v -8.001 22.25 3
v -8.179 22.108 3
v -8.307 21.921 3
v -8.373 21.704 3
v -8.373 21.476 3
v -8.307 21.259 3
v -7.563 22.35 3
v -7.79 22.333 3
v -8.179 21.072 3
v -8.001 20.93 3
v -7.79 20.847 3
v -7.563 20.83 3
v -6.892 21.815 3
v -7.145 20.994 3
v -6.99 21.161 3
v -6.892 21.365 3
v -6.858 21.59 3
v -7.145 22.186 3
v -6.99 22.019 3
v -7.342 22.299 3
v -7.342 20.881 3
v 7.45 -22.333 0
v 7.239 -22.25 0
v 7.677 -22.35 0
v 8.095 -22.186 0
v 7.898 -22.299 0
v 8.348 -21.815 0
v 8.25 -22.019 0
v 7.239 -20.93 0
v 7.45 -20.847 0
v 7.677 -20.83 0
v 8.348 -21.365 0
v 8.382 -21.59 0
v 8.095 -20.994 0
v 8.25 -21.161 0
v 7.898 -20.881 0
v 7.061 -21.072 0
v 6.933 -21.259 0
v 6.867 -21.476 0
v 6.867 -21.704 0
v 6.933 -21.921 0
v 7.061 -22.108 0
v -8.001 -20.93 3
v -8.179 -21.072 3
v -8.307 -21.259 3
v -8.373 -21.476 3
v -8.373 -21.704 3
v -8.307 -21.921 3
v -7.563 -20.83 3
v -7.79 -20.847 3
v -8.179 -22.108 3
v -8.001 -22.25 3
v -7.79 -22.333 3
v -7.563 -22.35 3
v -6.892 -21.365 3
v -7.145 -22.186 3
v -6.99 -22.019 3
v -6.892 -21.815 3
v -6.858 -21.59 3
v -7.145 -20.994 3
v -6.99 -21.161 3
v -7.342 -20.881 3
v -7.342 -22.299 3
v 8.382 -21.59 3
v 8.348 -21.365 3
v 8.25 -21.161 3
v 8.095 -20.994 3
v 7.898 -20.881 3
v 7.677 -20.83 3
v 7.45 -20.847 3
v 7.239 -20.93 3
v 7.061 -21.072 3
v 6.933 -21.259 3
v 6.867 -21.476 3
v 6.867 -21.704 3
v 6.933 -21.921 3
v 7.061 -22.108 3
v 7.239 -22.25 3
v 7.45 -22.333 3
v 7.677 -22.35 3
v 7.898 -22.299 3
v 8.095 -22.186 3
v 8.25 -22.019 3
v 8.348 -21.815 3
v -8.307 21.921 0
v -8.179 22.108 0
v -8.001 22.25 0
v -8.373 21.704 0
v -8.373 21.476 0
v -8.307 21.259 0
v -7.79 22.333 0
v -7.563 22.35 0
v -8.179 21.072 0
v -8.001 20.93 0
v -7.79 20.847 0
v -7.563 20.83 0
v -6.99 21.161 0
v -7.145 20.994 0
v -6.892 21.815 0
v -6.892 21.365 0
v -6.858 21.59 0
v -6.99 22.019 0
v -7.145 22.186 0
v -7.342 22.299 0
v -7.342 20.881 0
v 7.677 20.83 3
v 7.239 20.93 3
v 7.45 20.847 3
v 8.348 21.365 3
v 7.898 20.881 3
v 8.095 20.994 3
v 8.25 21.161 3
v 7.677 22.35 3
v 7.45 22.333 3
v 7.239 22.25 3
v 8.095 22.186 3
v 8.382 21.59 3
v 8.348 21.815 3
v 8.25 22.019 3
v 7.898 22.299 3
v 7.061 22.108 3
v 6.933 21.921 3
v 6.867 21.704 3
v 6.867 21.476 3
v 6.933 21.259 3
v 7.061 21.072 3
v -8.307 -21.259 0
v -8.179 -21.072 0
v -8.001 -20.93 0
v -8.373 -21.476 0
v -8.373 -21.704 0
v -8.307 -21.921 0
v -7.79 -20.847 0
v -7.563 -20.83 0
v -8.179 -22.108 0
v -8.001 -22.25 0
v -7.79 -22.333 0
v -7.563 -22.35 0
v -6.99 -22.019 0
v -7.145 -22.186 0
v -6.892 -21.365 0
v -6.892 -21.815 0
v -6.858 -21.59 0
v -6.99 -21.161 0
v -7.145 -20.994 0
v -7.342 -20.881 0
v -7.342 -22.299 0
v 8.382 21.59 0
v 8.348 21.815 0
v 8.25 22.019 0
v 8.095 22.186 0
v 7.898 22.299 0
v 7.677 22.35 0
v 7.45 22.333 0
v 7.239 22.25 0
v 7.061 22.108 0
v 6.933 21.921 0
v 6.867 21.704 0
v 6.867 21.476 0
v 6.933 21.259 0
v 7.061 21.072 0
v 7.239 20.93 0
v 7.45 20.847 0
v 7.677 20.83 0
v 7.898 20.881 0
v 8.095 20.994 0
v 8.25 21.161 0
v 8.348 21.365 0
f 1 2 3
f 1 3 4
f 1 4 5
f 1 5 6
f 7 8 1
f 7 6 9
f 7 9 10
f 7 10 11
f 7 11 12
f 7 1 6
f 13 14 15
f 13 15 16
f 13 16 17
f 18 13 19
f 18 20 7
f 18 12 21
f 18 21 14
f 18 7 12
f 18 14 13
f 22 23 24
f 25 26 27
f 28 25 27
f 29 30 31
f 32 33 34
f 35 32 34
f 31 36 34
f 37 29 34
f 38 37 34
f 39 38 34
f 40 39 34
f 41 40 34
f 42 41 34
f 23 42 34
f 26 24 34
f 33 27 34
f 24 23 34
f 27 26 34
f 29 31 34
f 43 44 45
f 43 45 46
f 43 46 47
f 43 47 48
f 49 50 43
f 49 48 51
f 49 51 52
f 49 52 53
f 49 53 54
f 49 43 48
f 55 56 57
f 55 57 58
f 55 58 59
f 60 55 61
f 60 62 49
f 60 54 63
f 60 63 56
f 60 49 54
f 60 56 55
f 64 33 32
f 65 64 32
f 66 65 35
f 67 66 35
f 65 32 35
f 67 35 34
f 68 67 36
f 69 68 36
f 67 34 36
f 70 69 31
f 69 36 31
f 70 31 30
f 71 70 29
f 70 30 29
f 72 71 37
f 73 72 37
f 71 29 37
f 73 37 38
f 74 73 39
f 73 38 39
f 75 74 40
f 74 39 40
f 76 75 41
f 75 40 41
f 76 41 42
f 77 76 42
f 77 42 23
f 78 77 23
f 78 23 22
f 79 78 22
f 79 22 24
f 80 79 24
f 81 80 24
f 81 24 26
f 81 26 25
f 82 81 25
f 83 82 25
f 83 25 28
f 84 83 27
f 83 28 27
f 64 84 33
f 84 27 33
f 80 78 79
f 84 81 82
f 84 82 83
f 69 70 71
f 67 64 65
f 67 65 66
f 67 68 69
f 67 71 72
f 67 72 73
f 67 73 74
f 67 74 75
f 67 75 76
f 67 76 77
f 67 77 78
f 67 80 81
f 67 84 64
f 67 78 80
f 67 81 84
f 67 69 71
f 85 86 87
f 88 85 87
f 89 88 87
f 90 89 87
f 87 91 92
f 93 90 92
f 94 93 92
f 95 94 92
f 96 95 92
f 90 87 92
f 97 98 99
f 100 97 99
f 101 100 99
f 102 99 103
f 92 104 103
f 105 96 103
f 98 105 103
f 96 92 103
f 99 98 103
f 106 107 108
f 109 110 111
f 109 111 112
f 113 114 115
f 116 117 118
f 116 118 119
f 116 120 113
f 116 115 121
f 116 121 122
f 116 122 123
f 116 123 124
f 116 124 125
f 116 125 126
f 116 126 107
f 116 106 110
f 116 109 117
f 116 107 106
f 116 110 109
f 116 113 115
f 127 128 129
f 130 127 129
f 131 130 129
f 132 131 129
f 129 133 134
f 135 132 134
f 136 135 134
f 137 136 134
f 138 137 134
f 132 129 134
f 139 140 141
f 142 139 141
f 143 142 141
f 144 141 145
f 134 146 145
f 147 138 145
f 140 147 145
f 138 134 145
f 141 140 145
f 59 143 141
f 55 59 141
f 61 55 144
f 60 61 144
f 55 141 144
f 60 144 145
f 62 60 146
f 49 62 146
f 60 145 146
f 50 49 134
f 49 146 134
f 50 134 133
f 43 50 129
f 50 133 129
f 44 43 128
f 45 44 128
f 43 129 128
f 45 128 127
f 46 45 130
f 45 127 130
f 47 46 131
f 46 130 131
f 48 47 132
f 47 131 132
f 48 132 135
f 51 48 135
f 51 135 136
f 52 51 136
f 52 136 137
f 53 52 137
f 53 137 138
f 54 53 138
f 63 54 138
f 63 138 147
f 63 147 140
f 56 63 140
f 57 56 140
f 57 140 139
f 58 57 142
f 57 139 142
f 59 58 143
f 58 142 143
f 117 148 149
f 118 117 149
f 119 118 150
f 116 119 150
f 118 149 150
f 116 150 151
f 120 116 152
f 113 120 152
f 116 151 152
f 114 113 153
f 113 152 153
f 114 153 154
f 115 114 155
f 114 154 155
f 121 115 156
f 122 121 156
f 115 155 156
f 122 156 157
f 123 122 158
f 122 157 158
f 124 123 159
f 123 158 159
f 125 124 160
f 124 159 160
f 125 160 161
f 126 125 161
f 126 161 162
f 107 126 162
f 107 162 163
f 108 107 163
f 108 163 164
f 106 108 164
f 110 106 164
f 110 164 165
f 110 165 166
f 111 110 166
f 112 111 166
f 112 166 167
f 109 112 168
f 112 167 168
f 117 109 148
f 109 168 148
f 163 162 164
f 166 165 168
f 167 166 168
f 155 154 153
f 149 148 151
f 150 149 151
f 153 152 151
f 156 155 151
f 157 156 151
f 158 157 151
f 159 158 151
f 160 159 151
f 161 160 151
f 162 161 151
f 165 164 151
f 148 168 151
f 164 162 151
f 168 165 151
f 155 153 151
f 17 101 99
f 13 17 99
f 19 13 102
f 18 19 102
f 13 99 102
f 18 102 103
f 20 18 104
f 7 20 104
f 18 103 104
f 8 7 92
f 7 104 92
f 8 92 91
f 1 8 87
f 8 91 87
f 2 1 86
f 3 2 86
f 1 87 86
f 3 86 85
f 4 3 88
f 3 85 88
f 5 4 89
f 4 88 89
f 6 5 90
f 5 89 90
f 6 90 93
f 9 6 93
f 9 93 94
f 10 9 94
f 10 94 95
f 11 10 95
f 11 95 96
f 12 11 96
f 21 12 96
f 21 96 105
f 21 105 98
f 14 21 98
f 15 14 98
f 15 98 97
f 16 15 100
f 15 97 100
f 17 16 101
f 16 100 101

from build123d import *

# Parameters (mm, degrees)
SKETCH2_R             = 0.762
BOSS_EXTRUDE2_DEPTH   = 3
BOSS_EXTRUDE2_2_DEPTH = 3
BOSS_EXTRUDE2_3_DEPTH = 3
BOSS_EXTRUDE2_4_DEPTH = 3


with BuildPart() as part:
    # Sketch2 → Boss-Extrude2 (new body)
    with BuildSketch(Plane.XY):
        with Locations((-7.62, 21.59)):
            Circle(SKETCH2_R)
    extrude(amount=BOSS_EXTRUDE2_DEPTH)


with BuildPart() as body_2:
    # Sketch2 → Boss-Extrude2 2 (new body)
    with BuildSketch(Plane.XY):
        with Locations((7.62, 21.59)):
            Circle(SKETCH2_R)
    extrude(amount=BOSS_EXTRUDE2_2_DEPTH)


with BuildPart() as body_3:
    # Sketch2 → Boss-Extrude2 3 (new body)
    with BuildSketch(Plane.XY):
        with Locations((7.62, -21.59)):
            Circle(SKETCH2_R)
    extrude(amount=BOSS_EXTRUDE2_3_DEPTH)


with BuildPart() as body_4:
    # Sketch2 → Boss-Extrude2 4 (new body)
    with BuildSketch(Plane.XY):
        with Locations((-7.62, -21.59)):
            Circle(SKETCH2_R)
    extrude(amount=BOSS_EXTRUDE2_4_DEPTH)


solid = Compound([part.part, body_2.part, body_3.part, body_4.part])
